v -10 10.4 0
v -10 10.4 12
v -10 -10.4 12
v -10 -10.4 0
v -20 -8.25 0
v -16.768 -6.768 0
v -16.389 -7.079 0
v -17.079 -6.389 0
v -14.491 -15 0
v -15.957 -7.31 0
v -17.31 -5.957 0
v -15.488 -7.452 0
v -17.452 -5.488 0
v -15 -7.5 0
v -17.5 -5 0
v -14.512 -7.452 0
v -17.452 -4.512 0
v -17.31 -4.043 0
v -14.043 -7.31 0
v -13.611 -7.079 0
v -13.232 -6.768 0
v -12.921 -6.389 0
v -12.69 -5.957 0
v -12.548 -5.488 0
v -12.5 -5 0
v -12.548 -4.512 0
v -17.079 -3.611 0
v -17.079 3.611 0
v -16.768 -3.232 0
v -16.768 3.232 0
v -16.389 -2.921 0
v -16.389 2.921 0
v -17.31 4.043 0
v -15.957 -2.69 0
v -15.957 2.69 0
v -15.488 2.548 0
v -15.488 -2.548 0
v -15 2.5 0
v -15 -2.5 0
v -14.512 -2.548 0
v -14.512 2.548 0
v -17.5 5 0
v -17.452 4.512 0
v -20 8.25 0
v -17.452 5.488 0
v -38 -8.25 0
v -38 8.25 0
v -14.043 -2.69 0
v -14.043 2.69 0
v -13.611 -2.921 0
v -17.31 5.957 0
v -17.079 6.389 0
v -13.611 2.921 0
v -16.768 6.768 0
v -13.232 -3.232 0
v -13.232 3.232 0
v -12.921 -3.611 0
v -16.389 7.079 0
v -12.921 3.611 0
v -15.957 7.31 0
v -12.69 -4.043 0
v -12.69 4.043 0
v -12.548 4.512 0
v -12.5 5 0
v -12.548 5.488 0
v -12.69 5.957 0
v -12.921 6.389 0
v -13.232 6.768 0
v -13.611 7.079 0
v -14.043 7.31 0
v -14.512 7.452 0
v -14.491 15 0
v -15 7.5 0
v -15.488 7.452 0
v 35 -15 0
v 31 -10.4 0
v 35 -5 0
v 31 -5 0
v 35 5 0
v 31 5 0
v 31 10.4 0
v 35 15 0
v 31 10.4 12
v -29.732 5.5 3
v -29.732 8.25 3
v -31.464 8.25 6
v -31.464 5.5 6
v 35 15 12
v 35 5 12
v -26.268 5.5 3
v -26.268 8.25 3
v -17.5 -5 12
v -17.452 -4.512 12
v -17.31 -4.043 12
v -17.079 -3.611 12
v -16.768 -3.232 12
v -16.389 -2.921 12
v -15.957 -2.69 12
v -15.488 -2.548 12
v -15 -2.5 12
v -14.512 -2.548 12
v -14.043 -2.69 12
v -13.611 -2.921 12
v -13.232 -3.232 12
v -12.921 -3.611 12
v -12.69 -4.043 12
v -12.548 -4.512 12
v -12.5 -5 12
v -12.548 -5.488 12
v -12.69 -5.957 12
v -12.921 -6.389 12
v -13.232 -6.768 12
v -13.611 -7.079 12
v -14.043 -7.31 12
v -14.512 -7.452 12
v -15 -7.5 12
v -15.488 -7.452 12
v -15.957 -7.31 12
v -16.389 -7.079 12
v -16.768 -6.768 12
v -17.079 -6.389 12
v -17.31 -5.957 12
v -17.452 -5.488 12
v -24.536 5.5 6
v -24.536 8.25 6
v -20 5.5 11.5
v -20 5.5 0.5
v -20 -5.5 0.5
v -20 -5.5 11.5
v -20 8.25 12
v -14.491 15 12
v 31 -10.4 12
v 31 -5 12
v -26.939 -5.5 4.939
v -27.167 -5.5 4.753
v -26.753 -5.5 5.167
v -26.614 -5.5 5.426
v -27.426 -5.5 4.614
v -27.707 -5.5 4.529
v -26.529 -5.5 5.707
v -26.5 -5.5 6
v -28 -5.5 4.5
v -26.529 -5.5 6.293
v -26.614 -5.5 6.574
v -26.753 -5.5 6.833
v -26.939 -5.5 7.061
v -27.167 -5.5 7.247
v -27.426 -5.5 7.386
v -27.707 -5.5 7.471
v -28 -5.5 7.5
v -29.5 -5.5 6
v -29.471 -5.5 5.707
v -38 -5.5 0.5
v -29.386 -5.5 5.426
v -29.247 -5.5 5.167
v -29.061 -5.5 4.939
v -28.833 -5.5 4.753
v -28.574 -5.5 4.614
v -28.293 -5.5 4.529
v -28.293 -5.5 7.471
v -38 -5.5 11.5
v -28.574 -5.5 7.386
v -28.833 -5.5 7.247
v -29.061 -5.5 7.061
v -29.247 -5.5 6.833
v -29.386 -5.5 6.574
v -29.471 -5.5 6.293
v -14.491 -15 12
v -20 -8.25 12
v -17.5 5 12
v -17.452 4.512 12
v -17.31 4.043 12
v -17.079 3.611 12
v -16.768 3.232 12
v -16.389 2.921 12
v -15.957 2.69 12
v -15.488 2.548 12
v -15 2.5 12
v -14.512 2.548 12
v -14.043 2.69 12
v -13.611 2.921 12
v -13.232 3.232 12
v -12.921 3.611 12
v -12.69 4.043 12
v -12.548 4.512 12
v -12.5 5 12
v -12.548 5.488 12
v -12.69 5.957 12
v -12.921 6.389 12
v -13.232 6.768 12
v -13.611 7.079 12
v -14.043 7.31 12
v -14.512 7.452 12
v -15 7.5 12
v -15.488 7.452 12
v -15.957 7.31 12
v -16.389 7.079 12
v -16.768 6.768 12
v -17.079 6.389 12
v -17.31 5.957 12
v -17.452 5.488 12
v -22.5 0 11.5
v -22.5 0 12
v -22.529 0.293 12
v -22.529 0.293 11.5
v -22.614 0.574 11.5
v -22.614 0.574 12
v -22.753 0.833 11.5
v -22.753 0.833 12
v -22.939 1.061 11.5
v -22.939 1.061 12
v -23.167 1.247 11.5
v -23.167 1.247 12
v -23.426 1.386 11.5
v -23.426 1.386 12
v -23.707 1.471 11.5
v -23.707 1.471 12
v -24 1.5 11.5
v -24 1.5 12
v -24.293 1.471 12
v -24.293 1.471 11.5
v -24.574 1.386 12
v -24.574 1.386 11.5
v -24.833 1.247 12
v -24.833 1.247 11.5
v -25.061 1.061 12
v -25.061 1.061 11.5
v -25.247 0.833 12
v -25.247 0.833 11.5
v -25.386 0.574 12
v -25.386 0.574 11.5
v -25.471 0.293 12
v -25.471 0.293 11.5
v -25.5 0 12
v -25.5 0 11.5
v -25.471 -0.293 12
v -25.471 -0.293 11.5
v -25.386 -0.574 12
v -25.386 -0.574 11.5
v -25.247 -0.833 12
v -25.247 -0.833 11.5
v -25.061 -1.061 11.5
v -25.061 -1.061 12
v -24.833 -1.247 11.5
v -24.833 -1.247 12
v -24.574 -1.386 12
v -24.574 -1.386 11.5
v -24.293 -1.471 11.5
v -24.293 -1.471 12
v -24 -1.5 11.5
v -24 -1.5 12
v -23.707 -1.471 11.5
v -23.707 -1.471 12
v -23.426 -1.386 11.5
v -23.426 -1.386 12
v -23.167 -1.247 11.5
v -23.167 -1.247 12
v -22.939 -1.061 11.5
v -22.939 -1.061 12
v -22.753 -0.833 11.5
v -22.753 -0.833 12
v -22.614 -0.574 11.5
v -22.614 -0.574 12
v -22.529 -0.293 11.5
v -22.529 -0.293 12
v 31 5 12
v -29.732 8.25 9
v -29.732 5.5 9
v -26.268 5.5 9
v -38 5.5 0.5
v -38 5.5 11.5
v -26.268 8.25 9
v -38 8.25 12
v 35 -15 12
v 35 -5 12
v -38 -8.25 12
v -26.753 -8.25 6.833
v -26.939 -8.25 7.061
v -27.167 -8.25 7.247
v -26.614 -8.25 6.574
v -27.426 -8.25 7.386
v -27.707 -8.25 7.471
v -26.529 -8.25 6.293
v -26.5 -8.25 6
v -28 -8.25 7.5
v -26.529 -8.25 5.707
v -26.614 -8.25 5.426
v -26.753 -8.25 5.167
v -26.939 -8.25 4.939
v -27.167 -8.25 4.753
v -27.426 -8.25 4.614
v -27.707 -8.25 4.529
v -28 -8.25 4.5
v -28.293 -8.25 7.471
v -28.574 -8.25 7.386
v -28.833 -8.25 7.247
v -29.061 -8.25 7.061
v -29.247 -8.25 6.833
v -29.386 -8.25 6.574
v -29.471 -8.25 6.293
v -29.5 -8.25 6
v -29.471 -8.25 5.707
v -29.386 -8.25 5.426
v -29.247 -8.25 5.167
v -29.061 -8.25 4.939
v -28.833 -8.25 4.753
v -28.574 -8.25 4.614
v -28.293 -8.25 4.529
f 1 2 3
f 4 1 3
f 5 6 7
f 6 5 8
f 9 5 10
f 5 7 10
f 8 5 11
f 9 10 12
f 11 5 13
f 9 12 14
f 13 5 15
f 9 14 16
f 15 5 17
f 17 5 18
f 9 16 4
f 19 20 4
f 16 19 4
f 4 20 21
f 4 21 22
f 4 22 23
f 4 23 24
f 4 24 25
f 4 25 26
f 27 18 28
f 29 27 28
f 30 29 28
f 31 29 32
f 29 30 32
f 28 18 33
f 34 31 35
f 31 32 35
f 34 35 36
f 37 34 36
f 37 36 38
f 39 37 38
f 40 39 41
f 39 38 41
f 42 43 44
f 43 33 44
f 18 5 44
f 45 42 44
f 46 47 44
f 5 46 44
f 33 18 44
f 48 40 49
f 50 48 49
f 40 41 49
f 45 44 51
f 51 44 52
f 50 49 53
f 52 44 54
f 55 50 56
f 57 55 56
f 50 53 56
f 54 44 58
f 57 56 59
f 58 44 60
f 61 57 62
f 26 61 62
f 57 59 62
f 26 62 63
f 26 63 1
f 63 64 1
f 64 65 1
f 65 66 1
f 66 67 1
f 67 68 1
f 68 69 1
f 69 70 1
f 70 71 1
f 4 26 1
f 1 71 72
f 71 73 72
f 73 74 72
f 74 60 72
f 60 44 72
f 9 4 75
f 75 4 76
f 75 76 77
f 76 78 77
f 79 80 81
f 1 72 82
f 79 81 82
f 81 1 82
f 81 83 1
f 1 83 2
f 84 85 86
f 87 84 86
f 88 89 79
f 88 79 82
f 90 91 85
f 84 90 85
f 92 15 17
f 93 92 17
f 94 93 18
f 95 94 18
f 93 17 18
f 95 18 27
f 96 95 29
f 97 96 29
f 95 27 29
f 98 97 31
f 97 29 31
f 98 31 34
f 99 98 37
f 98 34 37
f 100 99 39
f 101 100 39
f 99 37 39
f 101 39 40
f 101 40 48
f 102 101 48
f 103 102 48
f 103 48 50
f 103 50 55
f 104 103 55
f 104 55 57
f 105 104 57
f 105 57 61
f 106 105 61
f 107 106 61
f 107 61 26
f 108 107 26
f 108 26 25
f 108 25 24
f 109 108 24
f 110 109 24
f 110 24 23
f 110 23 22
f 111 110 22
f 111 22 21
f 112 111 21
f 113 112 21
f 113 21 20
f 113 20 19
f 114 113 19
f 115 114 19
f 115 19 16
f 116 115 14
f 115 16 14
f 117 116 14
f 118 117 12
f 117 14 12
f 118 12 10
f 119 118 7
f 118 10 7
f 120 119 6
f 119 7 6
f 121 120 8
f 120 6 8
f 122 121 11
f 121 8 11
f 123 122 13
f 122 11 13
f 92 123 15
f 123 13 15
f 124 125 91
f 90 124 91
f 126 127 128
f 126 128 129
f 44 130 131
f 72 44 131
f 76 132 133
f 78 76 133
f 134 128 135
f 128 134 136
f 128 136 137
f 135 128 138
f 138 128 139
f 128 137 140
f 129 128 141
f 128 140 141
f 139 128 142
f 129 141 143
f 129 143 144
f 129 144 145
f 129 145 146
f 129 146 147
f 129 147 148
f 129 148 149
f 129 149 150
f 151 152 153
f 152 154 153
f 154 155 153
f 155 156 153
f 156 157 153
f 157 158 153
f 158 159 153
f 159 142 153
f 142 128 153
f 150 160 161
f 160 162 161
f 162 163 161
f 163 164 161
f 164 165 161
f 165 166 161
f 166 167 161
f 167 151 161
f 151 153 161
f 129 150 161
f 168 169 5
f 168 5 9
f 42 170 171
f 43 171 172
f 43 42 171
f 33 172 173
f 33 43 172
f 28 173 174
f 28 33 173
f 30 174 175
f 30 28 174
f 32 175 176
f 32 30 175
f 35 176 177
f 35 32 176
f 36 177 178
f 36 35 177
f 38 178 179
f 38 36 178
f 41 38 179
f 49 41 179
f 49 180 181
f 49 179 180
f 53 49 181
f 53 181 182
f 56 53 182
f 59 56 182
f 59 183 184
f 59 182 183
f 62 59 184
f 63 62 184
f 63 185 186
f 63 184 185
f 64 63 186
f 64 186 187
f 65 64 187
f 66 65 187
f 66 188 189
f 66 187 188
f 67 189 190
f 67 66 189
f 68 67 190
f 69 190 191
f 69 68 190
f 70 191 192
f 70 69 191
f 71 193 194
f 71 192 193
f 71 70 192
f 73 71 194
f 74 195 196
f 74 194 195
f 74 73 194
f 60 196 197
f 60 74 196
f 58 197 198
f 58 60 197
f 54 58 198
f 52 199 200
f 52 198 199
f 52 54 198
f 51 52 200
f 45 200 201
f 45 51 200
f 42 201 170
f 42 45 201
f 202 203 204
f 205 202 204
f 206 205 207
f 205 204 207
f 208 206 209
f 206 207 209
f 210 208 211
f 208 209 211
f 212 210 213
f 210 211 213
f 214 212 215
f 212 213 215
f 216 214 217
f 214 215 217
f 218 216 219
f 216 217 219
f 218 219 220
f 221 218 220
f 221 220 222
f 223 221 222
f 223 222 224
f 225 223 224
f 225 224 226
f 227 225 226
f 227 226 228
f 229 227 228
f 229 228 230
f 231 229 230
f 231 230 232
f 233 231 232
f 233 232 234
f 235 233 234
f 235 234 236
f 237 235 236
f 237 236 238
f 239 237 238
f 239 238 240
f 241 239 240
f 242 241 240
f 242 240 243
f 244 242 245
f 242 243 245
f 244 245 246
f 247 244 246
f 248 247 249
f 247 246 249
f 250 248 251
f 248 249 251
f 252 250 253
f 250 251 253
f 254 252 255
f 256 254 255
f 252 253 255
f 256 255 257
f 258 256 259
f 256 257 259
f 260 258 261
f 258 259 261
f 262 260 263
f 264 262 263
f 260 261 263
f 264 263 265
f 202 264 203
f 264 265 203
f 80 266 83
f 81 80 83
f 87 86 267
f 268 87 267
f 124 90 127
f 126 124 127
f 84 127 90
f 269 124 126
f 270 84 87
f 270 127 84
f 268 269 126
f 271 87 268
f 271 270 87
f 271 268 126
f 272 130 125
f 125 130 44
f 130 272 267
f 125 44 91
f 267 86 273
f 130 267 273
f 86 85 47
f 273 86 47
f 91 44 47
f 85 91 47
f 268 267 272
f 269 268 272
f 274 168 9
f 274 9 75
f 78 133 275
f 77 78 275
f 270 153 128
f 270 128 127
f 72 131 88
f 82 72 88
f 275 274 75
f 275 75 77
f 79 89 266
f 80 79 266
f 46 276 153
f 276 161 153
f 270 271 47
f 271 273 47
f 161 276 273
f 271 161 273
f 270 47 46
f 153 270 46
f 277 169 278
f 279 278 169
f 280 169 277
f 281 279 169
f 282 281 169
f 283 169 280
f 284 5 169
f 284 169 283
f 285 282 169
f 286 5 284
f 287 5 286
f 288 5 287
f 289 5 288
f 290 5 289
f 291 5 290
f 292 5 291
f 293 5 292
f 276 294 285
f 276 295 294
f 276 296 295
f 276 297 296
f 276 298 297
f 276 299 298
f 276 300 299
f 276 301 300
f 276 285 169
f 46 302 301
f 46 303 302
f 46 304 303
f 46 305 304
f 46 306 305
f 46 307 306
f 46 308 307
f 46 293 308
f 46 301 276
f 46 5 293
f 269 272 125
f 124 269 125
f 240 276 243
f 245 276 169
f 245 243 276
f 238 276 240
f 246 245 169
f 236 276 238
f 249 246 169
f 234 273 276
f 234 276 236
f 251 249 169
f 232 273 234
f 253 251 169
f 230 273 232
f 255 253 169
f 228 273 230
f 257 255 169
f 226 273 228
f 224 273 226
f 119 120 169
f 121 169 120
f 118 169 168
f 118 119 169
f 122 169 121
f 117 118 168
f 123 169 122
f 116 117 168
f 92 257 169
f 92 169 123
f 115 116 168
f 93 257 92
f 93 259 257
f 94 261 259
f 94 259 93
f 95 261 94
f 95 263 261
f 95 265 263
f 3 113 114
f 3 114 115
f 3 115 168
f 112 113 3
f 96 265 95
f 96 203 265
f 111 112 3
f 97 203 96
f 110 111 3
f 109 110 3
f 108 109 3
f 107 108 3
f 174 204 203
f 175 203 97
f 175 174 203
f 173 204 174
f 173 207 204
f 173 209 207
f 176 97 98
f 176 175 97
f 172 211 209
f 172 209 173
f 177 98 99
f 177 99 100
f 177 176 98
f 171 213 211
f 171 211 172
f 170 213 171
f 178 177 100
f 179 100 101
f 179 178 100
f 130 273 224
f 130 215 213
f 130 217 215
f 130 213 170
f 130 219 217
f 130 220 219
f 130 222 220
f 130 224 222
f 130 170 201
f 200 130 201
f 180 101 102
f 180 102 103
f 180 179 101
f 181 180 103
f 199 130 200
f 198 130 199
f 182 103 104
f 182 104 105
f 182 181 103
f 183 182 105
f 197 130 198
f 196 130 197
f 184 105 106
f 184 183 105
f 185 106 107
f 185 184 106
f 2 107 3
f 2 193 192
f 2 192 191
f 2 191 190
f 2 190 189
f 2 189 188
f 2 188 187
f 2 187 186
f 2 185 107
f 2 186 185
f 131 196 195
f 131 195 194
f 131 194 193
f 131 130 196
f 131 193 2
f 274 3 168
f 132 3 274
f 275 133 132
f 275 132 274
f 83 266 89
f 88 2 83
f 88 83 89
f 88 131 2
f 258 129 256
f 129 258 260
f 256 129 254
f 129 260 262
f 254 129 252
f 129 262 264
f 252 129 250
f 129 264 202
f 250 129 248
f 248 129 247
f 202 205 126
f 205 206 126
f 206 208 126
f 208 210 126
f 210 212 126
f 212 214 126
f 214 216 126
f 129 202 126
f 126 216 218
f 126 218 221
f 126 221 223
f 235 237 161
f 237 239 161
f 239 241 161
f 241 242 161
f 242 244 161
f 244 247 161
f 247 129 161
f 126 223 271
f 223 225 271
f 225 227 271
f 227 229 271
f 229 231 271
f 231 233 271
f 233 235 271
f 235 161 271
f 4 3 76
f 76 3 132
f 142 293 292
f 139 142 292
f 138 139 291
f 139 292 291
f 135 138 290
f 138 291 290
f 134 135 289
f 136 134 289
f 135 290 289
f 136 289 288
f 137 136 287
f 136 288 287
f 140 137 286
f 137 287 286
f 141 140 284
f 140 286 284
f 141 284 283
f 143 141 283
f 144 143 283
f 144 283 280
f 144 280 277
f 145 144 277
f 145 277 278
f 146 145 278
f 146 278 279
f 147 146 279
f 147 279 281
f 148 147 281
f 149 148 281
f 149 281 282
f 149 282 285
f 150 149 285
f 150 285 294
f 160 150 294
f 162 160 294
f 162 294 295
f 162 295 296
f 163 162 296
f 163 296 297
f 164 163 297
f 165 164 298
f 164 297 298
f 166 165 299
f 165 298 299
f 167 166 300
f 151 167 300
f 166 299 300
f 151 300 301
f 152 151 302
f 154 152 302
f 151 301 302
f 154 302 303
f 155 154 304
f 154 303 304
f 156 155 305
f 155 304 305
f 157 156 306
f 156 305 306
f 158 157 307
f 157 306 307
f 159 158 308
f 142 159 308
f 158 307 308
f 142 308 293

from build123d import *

# Parameters (mm, degrees)
SKETCH_2_W           = 30.5
SKETCH_2_H           = 20.5
SKETCH_2_W_2         = 22.5
SKETCH_2_H_2         = 12.5
EXTRUDE_1_DEPTH      = 12
SKETCH_3_W           = 2.75
SKETCH_3_H           = 10
EXTRUDE_2_DEPTH      = 3
SKETCH_4_W           = 4.940698383
SKETCH_4_H           = 10
CUT_EXTRUDE_1_DEPTH  = 9
EXTRUDE_3_DEPTH      = 20
EXTRUDE_4_REACH      = 38.805
SKETCH_7_R           = 1.252665059
CUT_EXTRUDE_2_DEPTH  = 41.374032496
SKETCH_8_W           = 10
SKETCH_8_H           = 10
CUT_EXTRUDE_3_DEPTH  = 18
SKETCH_10_W          = 23.106147985
SKETCH_10_H          = 7.754593222
CUT_EXTRUDE_4_DEPTH  = 42.146840705
SKETCH_11_R          = 1.5
CUT_EXTRUDE_5_DEPTH  = 44.934610502
CUT_EXTRUDE_6_REACH  = 60.181
SKETCH_12_W          = 11
SKETCH_12_H          = 11
SKETCH_13_W          = 23.5
SKETCH_13_H          = 13.5
CUT_EXTRUDE_7_DEPTH  = 42.146840705
SKETCH_14_W          = 9.129424231
SKETCH_14_H          = 10.218893611
CUT_EXTRUDE_8_DEPTH  = 42.146840705
SKETCH_15_W          = 55
SKETCH_15_H          = 30
EXTRUDE_5_DEPTH      = 12
CUT_EXTRUDE_9_DEPTH  = 43.579337712
SKETCH_18_R          = 2.5
CUT_EXTRUDE_10_DEPTH = 43.579337712
CUT_EXTRUDE_11_DEPTH = 43.579337712
CUT_EXTRUDE_12_REACH = 48.136
CUT_EXTRUDE_13_REACH = 44.579
SKETCH_21_R          = 1.5


with BuildPart() as part:
    # 草图2 → 凸台-拉伸1 (new body)
    with BuildSketch(Plane.XY):
        Rectangle(SKETCH_2_W, SKETCH_2_H)
        Rectangle(SKETCH_2_W_2, SKETCH_2_H_2, mode=Mode.SUBTRACT)
    extrude(amount=EXTRUDE_1_DEPTH)

    # 草图3 → 凸台-拉伸2 (add)
    with BuildSketch(Plane.XY.offset(12)):
        with Locations((-16.625, 0)):
            Rectangle(SKETCH_3_W, SKETCH_3_H)
    extrude_2 = extrude(amount=-EXTRUDE_2_DEPTH)

    # 镜向1: 凸台-拉伸2 across plane
    add(extrude_2.mirror(Plane(origin=(0, 0, 0), x_dir=(0, 0, 1), z_dir=(1, 0, 0))))

    # 草图4 → 切除-拉伸1 (cut)
    with BuildSketch(Plane(origin=(0, 0, 0), x_dir=(-1, 0, 0), z_dir=(0, 0, -1))):
        with Locations((15.220349192, 0)):
            Rectangle(SKETCH_4_W, SKETCH_4_H)
    cut_extrude_1 = extrude(amount=-CUT_EXTRUDE_1_DEPTH, mode=Mode.SUBTRACT)

    # 镜向2: 切除-拉伸1 across plane
    add(cut_extrude_1.mirror(Plane(origin=(0, 0, 0), x_dir=(0, 0, 1), z_dir=(1, 0, 0))), mode=Mode.SUBTRACT)

    # 草图5 → 凸台-拉伸3 (add)
    with BuildSketch(Plane.ZY.offset(18)):
        Polygon((12, 10.25), (12, 5), (12, -5), (12, -10.25), (0, -10.25), (0, -5), (0, 5), (0, 10.25), align=None)
    extrude(amount=EXTRUDE_3_DEPTH)

    # 草图6 → 凸台-拉伸4 (add, up to next)
    with BuildSketch(Plane.ZY.offset(15.25), mode=Mode.PRIVATE) as extrude_4_sk1:
        Polygon((12, -5), (9, -5), (0, -5), (0, -10.25), (12, -10.25), align=None)
    extrude_4_tool1 = extrude(extrude_4_sk1.sketch, amount=EXTRUDE_4_REACH, mode=Mode.PRIVATE) - part.part
    extrude_4 = extrude_4_tool1.solids().sort_by_distance((-15.25, -7.625, 6))[0]
    add(extrude_4)

    # 镜向3: 凸台-拉伸4 across plane
    add(extrude_4.mirror(Plane.ZX))

    # 草图7 → 切除-拉伸2 (cut, through all)
    with BuildSketch(Plane(origin=(0, 0, 9), x_dir=(-1, 0, 0), z_dir=(0, 0, -1))):
        with Locations((15.487865972, 2.296552608)):
            Circle(SKETCH_7_R)
    cut_extrude_2 = extrude(amount=-CUT_EXTRUDE_2_DEPTH, mode=Mode.SUBTRACT)

    # 草图8 → 切除-拉伸3 (cut)
    with BuildSketch(Plane.ZY.offset(38)):
        with Locations((6, 0)):
            Rectangle(SKETCH_8_W, SKETCH_8_H)
    extrude(amount=-CUT_EXTRUDE_3_DEPTH, mode=Mode.SUBTRACT)

    # 草图10 → 切除-拉伸4 (cut, through all)
    with BuildSketch(Plane(origin=(0, 0, 0), x_dir=(-1, 0, 0), z_dir=(0, 0, -1))):
        with Locations((31.553073992, 12.127296611)):
            Rectangle(SKETCH_10_W, SKETCH_10_H)
    cut_extrude_4 = extrude(amount=-CUT_EXTRUDE_4_DEPTH, mode=Mode.SUBTRACT)

    # 镜向4: 切除-拉伸4 across plane
    add(cut_extrude_4.mirror(Plane.ZX), mode=Mode.SUBTRACT)

    # 草图11 → 切除-拉伸5 (cut, through all)
    with BuildSketch(Plane.XZ.offset(8.25)):
        with Locations(Location((-28, 6, 0), (0, 0, 270))):
            Circle(SKETCH_11_R)
    extrude(amount=-CUT_EXTRUDE_5_DEPTH, mode=Mode.SUBTRACT)

    # 镜向5: 切除-拉伸2 across plane
    add(cut_extrude_2.mirror(Plane(origin=(0, 0, 0), x_dir=(0, 0, 1), z_dir=(1, 0, 0))), mode=Mode.SUBTRACT)

    # 切除-拉伸6: up to this face of the body (flat: up to its plane)
    cut_extrude_6_end = Plane(part.part.faces().sort_by_distance((-20, 0, 6))[0])
    # 草图12 → 切除-拉伸6 (cut, up to the picked face)
    with BuildSketch(Plane.ZY.offset(38), mode=Mode.PRIVATE) as cut_extrude_6_sk1:
        with Locations((6, 0)):
            Rectangle(SKETCH_12_W, SKETCH_12_H)
    cut_extrude_6_tool1 = split(extrude(cut_extrude_6_sk1.sketch, amount=-CUT_EXTRUDE_6_REACH, mode=Mode.PRIVATE), bisect_by=cut_extrude_6_end, keep=Keep.BOTH, mode=Mode.PRIVATE)
    add(cut_extrude_6_tool1.solids().sort_by(Axis((-38, 0, 6), (1, 0, 0)))[0], mode=Mode.SUBTRACT)

    # 草图13 → 切除-拉伸7 (cut, through all)
    with BuildSketch(Plane.XY.offset(12)):
        Rectangle(SKETCH_13_W, SKETCH_13_H)
    extrude(amount=-CUT_EXTRUDE_7_DEPTH, mode=Mode.SUBTRACT)

    # 草图14 → 切除-拉伸8 (cut, through all)
    with BuildSketch(Plane.XY.offset(12)):
        with Locations((13.435287884, 0.109446806)):
            Rectangle(SKETCH_14_W, SKETCH_14_H)
    extrude(amount=-CUT_EXTRUDE_8_DEPTH, mode=Mode.SUBTRACT)

    # 草图15 → 凸台-拉伸5 (add)
    with BuildSketch(Plane.XY.offset(12)):
        with Locations((7.5, 0)):
            Rectangle(SKETCH_15_W, SKETCH_15_H)
    extrude(amount=-EXTRUDE_5_DEPTH)

    # 草图17 → 切除-拉伸9 (cut, through all)
    with BuildSketch(Plane.XY.offset(12)):
        Polygon((35, -5), (35, 5), (31, 5), (31, 10.4), (-10, 10.4), (-10, -10.4), (31, -10.4), (31, -5), align=None)
    extrude(amount=-CUT_EXTRUDE_9_DEPTH, mode=Mode.SUBTRACT)

    # 草图18 → 切除-拉伸10 (cut, through all)
    with BuildSketch(Plane(origin=(0, 0, 0), x_dir=(-1, 0, 0), z_dir=(0, 0, -1))):
        with Locations((15, -5)):
            Circle(SKETCH_18_R)
    cut_extrude_10 = extrude(amount=-CUT_EXTRUDE_10_DEPTH, mode=Mode.SUBTRACT)

    # 镜向6: 切除-拉伸10 across plane
    add(cut_extrude_10.mirror(Plane.ZX), mode=Mode.SUBTRACT)

    # 草图19 → 切除-拉伸11 (cut, through all)
    with BuildSketch(Plane(origin=(0, 0, 0), x_dir=(-1, 0, 0), z_dir=(0, 0, -1))):
        Polygon((20, 8.25), (14.491422615, 15), (20, 15), align=None)
    cut_extrude_11 = extrude(amount=-CUT_EXTRUDE_11_DEPTH, mode=Mode.SUBTRACT)

    # 镜向7: 切除-拉伸11 across plane
    add(cut_extrude_11.mirror(Plane.ZX), mode=Mode.SUBTRACT)

    # 草图20 → 切除-拉伸12 (cut, up to next)
    with BuildSketch(Plane(origin=(0, 8.25, 0), x_dir=(1, 0, 0), z_dir=(0, 1, 0)), mode=Mode.PRIVATE) as cut_extrude_12_sk1:
        Polygon((-26.267949192, -3), (-29.732050808, -3), (-31.464101615, -6), (-29.732050808, -9), (-26.267949192, -9), (-24.535898385, -6), align=None)
    cut_extrude_12_tool1 = extrude(cut_extrude_12_sk1.sketch, amount=-CUT_EXTRUDE_12_REACH, mode=Mode.PRIVATE) & part.part
    add(cut_extrude_12_tool1.solids().sort_by_distance((-28, 8.25, 6))[0], mode=Mode.SUBTRACT)

    # 草图21 → 切除-拉伸13 (cut, up to next)
    with BuildSketch(Plane.XY.offset(12), mode=Mode.PRIVATE) as cut_extrude_13_sk1:
        with Locations((-24, 0)):
            Circle(SKETCH_21_R)
    cut_extrude_13_tool1 = extrude(cut_extrude_13_sk1.sketch, amount=-CUT_EXTRUDE_13_REACH, mode=Mode.PRIVATE) & part.part
    add(cut_extrude_13_tool1.solids().sort_by_distance((-24, 0, 12))[0], mode=Mode.SUBTRACT)


solid = part.part
